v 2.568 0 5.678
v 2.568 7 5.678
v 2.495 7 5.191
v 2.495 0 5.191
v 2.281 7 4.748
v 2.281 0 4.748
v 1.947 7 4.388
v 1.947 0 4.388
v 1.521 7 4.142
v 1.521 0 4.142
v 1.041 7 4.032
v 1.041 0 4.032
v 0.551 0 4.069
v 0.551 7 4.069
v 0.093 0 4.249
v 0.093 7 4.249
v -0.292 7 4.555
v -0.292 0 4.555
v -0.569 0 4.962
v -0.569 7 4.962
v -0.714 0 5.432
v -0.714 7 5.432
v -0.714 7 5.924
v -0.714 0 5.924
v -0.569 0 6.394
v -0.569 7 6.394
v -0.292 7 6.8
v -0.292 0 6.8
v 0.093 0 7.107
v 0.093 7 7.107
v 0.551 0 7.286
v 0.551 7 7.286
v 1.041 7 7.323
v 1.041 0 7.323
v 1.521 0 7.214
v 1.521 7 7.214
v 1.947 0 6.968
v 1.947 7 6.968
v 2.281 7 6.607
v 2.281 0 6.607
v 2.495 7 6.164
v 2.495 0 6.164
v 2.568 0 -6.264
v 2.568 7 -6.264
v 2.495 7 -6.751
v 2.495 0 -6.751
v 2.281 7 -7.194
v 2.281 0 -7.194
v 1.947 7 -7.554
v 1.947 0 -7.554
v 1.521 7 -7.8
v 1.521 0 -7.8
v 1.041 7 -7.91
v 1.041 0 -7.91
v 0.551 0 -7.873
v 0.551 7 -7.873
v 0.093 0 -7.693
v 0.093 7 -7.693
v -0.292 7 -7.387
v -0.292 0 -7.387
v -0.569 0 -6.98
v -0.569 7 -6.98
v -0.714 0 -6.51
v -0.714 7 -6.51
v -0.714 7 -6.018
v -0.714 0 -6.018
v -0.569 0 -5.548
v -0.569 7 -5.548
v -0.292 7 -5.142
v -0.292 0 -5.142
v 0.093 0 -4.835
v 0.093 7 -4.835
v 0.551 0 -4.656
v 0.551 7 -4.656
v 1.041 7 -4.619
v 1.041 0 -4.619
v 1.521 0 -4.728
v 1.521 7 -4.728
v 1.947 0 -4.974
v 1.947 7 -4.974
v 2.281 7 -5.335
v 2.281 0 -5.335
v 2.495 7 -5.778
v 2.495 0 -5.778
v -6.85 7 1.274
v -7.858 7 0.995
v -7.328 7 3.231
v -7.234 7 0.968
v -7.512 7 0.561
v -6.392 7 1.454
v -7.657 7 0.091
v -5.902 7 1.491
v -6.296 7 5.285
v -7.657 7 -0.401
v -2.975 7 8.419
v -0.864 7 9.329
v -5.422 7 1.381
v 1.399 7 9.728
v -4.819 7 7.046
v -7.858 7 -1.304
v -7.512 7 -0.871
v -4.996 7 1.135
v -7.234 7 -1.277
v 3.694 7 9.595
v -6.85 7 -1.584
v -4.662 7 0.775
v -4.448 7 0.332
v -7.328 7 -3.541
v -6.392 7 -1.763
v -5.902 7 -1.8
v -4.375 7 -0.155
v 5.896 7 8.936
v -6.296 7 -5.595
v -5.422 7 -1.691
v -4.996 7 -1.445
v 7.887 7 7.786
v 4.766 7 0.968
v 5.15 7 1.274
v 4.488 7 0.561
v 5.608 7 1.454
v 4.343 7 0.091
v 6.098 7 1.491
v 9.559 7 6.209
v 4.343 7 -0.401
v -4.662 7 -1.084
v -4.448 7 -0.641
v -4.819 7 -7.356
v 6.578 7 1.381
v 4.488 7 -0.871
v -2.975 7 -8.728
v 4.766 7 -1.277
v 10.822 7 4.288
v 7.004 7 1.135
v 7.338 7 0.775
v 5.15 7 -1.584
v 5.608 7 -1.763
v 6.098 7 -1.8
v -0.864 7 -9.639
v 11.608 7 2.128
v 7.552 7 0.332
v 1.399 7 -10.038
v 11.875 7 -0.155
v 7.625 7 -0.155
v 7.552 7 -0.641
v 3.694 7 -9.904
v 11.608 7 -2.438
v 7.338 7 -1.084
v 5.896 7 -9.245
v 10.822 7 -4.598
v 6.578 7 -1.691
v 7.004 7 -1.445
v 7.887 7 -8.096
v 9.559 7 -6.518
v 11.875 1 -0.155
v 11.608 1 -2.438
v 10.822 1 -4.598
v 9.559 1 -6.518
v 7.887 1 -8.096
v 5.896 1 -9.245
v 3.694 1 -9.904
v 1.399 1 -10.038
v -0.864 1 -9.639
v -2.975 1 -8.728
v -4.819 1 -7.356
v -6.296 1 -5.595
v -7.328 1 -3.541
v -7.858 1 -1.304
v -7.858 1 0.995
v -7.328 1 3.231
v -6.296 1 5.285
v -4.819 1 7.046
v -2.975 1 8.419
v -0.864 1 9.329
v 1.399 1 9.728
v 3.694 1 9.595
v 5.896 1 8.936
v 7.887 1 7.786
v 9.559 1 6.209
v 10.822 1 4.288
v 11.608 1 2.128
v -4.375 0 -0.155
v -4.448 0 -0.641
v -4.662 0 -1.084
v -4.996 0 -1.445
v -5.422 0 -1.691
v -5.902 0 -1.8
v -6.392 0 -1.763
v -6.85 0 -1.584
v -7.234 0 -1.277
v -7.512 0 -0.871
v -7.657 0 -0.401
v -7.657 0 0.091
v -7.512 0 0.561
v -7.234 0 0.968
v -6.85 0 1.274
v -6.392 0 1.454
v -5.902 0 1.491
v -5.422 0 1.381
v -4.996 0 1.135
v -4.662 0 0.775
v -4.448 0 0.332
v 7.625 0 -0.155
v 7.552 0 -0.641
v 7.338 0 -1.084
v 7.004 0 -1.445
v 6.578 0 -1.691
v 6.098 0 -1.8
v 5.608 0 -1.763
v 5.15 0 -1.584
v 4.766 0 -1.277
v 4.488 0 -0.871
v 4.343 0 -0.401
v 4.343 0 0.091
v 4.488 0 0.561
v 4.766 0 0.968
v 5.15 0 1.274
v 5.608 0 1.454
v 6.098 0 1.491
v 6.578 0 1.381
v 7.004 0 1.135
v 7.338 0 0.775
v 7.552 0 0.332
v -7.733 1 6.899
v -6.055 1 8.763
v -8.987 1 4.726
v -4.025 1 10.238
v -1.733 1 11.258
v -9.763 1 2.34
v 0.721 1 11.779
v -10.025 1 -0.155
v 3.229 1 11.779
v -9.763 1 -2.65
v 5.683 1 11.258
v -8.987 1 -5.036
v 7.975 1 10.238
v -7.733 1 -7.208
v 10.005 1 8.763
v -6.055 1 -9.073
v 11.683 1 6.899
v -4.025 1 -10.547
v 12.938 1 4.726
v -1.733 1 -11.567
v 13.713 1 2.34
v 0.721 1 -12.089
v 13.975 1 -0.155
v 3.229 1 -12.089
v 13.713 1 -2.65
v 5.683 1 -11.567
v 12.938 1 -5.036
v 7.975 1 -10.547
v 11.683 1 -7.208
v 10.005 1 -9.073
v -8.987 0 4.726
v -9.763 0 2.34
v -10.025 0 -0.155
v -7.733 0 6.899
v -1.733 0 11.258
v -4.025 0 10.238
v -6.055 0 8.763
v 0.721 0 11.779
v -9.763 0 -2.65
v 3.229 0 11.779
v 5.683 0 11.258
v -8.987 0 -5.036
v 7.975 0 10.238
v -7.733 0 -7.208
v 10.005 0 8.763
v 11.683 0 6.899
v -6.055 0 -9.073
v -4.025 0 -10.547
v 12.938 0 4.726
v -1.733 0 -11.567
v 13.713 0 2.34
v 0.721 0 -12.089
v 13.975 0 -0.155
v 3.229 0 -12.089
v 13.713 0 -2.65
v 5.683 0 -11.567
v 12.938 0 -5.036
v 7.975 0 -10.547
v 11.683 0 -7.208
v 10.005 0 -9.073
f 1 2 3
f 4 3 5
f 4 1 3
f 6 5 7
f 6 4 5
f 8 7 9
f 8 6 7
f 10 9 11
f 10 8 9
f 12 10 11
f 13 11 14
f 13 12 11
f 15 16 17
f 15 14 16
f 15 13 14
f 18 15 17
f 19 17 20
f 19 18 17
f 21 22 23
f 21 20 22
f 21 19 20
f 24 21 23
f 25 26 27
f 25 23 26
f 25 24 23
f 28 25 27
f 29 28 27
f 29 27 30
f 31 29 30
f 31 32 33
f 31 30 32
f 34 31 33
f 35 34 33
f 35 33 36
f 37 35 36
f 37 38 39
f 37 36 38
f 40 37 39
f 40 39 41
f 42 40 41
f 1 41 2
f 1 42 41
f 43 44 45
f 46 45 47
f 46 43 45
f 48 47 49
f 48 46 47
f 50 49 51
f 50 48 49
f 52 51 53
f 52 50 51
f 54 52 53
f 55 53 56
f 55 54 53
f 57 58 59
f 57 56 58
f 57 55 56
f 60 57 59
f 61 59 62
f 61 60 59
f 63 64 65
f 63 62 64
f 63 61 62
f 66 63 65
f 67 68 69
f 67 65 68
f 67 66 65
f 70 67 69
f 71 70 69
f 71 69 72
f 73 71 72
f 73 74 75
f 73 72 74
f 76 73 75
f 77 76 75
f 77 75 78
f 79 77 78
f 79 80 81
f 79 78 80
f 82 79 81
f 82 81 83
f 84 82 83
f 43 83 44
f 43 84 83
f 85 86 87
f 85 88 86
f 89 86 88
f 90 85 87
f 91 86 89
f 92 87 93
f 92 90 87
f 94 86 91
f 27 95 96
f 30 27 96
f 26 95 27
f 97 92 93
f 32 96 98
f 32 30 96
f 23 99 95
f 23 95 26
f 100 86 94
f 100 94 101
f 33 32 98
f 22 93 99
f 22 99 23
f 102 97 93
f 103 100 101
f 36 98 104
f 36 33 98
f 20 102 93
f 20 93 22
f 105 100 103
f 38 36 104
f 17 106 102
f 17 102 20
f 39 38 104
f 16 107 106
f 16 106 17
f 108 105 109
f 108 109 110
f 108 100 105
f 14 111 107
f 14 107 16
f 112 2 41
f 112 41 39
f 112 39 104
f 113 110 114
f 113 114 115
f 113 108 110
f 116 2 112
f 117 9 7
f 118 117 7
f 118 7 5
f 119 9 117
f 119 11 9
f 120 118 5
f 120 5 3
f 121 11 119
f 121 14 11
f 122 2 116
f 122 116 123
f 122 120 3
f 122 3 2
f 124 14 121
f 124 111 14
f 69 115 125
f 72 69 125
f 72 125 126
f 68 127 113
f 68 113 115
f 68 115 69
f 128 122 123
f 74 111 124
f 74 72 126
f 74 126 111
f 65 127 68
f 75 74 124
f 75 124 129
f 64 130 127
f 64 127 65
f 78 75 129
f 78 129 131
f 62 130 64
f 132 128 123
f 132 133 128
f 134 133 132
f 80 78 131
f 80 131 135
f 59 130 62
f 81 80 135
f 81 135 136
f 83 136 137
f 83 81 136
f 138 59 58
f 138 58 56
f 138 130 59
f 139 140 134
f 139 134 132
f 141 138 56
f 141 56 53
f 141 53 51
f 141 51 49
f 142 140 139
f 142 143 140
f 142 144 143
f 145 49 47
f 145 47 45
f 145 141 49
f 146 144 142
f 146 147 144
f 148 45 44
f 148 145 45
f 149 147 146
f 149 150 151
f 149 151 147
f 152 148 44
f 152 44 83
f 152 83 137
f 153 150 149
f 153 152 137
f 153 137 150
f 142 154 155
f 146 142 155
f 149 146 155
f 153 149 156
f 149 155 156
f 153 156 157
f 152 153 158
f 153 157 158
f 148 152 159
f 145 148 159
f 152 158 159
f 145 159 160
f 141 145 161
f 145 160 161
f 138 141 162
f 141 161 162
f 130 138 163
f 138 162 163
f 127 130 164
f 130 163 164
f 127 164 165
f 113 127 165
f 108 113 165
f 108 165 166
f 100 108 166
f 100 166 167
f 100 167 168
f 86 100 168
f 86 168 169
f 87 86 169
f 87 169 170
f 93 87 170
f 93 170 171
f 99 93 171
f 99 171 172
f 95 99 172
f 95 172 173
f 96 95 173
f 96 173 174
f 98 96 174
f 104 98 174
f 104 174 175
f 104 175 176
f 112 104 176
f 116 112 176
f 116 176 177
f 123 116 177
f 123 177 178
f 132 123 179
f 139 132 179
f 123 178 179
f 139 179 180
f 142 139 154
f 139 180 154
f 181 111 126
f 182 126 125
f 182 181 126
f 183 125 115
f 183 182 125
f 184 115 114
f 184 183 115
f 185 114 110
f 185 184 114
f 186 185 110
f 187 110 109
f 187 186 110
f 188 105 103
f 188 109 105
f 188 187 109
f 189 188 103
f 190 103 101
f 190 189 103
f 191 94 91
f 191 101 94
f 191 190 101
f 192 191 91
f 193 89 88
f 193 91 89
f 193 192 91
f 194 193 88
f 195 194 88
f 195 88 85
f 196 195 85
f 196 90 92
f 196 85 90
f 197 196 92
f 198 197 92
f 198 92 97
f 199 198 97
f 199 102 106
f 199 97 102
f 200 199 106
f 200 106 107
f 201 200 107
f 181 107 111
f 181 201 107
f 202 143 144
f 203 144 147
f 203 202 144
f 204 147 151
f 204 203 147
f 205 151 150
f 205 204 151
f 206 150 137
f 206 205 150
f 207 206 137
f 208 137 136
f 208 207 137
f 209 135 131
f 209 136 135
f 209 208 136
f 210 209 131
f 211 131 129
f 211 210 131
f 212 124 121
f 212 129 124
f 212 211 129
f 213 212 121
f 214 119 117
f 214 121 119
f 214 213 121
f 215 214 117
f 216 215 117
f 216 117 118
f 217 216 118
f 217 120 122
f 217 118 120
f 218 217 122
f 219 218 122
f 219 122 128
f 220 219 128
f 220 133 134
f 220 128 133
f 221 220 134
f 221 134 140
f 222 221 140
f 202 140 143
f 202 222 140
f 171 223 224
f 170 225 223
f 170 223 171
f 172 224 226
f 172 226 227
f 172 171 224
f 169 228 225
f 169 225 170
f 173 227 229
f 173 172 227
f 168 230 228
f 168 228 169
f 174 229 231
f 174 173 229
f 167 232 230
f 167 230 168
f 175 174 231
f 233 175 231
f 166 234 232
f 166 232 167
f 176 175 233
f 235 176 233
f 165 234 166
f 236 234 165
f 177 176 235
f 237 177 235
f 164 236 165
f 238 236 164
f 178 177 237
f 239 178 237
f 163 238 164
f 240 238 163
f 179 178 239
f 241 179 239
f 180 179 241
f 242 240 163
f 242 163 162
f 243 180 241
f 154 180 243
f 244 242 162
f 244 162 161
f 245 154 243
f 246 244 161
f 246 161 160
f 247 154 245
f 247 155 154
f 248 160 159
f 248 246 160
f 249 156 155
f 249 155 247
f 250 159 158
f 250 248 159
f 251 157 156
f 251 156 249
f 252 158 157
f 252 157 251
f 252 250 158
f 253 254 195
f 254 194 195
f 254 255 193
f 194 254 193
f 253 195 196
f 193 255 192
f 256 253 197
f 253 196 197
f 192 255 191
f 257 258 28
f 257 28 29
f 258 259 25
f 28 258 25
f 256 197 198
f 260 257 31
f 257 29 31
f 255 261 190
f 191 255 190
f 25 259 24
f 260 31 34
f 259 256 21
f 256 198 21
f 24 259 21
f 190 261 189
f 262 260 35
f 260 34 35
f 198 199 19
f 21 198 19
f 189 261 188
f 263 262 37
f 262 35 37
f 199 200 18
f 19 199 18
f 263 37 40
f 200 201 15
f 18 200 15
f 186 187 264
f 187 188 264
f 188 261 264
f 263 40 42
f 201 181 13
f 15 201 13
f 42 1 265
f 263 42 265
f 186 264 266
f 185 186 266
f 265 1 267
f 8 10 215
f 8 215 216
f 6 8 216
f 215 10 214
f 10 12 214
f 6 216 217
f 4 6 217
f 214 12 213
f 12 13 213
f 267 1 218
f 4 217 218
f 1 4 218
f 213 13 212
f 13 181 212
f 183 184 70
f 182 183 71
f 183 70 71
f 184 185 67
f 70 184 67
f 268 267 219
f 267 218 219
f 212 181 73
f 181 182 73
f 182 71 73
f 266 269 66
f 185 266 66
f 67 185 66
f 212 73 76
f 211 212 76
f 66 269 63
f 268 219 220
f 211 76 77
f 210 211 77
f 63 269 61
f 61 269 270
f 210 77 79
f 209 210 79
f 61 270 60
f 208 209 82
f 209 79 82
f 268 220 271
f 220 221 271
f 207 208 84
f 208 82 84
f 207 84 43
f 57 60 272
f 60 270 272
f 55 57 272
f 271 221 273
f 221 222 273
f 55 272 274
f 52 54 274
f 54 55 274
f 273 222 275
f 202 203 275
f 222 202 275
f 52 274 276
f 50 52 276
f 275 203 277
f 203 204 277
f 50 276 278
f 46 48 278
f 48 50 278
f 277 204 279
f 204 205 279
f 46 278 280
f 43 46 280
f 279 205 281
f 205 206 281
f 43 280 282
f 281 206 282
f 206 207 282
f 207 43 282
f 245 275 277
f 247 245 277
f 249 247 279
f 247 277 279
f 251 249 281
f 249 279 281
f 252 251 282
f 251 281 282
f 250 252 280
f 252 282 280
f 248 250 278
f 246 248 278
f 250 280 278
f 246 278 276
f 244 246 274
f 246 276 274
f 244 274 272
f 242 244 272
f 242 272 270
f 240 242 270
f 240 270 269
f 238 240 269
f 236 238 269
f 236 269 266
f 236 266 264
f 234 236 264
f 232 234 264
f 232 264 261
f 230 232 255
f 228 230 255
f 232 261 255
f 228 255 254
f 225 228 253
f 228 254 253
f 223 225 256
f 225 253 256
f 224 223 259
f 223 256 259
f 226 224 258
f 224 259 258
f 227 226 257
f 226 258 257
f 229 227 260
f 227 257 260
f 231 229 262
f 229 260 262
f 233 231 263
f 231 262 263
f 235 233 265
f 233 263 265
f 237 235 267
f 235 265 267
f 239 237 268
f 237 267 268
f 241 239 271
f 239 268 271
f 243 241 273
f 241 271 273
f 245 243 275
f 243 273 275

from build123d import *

# Parameters (mm, degrees)
SKETCH1_R           = 9.9
BOSS_EXTRUDE1_DEPTH = 7
SKETCH1_3_R         = 12
BOSS_EXTRUDE2_DEPTH = 1
SKETCH1_4_R         = 1.65
CUT_EXTRUDE1_DEPTH  = 31


with BuildPart() as part:
    # Sketch1 → Boss-Extrude1 (new body)
    with BuildSketch(Plane(origin=(0, 0, 0), x_dir=(1, 0, 0), z_dir=(0, 1, 0))):
        with Locations((1.975062748, 0.154777047)):
            Circle(SKETCH1_R)
    extrude(amount=BOSS_EXTRUDE1_DEPTH)

    # Sketch1<3> → Boss-Extrude2 (add)
    with BuildSketch(Plane(origin=(0, 0, 0), x_dir=(1, 0, 0), z_dir=(0, 1, 0))):
        with Locations((1.975062748, 0.154777047)):
            Circle(SKETCH1_3_R)
    extrude(amount=BOSS_EXTRUDE2_DEPTH)

    # Sketch1<4> → Cut-Extrude1 (cut)
    with BuildSketch(Plane(origin=(0, 0, 0), x_dir=(1, 0, 0), z_dir=(0, 1, 0))):
        with Locations((0.917956723, 6.264264553)):
            Circle(SKETCH1_4_R)
        with Locations((0.917956723, -5.677777134)):
            Circle(SKETCH1_4_R)
        with Locations((-6.024937252, 0.154777047)):
            Circle(SKETCH1_4_R)
        with Locations((5.975062748, 0.154777047)):
            Circle(SKETCH1_4_R)
    extrude(amount=CUT_EXTRUDE1_DEPTH, mode=Mode.SUBTRACT)


solid = part.part
